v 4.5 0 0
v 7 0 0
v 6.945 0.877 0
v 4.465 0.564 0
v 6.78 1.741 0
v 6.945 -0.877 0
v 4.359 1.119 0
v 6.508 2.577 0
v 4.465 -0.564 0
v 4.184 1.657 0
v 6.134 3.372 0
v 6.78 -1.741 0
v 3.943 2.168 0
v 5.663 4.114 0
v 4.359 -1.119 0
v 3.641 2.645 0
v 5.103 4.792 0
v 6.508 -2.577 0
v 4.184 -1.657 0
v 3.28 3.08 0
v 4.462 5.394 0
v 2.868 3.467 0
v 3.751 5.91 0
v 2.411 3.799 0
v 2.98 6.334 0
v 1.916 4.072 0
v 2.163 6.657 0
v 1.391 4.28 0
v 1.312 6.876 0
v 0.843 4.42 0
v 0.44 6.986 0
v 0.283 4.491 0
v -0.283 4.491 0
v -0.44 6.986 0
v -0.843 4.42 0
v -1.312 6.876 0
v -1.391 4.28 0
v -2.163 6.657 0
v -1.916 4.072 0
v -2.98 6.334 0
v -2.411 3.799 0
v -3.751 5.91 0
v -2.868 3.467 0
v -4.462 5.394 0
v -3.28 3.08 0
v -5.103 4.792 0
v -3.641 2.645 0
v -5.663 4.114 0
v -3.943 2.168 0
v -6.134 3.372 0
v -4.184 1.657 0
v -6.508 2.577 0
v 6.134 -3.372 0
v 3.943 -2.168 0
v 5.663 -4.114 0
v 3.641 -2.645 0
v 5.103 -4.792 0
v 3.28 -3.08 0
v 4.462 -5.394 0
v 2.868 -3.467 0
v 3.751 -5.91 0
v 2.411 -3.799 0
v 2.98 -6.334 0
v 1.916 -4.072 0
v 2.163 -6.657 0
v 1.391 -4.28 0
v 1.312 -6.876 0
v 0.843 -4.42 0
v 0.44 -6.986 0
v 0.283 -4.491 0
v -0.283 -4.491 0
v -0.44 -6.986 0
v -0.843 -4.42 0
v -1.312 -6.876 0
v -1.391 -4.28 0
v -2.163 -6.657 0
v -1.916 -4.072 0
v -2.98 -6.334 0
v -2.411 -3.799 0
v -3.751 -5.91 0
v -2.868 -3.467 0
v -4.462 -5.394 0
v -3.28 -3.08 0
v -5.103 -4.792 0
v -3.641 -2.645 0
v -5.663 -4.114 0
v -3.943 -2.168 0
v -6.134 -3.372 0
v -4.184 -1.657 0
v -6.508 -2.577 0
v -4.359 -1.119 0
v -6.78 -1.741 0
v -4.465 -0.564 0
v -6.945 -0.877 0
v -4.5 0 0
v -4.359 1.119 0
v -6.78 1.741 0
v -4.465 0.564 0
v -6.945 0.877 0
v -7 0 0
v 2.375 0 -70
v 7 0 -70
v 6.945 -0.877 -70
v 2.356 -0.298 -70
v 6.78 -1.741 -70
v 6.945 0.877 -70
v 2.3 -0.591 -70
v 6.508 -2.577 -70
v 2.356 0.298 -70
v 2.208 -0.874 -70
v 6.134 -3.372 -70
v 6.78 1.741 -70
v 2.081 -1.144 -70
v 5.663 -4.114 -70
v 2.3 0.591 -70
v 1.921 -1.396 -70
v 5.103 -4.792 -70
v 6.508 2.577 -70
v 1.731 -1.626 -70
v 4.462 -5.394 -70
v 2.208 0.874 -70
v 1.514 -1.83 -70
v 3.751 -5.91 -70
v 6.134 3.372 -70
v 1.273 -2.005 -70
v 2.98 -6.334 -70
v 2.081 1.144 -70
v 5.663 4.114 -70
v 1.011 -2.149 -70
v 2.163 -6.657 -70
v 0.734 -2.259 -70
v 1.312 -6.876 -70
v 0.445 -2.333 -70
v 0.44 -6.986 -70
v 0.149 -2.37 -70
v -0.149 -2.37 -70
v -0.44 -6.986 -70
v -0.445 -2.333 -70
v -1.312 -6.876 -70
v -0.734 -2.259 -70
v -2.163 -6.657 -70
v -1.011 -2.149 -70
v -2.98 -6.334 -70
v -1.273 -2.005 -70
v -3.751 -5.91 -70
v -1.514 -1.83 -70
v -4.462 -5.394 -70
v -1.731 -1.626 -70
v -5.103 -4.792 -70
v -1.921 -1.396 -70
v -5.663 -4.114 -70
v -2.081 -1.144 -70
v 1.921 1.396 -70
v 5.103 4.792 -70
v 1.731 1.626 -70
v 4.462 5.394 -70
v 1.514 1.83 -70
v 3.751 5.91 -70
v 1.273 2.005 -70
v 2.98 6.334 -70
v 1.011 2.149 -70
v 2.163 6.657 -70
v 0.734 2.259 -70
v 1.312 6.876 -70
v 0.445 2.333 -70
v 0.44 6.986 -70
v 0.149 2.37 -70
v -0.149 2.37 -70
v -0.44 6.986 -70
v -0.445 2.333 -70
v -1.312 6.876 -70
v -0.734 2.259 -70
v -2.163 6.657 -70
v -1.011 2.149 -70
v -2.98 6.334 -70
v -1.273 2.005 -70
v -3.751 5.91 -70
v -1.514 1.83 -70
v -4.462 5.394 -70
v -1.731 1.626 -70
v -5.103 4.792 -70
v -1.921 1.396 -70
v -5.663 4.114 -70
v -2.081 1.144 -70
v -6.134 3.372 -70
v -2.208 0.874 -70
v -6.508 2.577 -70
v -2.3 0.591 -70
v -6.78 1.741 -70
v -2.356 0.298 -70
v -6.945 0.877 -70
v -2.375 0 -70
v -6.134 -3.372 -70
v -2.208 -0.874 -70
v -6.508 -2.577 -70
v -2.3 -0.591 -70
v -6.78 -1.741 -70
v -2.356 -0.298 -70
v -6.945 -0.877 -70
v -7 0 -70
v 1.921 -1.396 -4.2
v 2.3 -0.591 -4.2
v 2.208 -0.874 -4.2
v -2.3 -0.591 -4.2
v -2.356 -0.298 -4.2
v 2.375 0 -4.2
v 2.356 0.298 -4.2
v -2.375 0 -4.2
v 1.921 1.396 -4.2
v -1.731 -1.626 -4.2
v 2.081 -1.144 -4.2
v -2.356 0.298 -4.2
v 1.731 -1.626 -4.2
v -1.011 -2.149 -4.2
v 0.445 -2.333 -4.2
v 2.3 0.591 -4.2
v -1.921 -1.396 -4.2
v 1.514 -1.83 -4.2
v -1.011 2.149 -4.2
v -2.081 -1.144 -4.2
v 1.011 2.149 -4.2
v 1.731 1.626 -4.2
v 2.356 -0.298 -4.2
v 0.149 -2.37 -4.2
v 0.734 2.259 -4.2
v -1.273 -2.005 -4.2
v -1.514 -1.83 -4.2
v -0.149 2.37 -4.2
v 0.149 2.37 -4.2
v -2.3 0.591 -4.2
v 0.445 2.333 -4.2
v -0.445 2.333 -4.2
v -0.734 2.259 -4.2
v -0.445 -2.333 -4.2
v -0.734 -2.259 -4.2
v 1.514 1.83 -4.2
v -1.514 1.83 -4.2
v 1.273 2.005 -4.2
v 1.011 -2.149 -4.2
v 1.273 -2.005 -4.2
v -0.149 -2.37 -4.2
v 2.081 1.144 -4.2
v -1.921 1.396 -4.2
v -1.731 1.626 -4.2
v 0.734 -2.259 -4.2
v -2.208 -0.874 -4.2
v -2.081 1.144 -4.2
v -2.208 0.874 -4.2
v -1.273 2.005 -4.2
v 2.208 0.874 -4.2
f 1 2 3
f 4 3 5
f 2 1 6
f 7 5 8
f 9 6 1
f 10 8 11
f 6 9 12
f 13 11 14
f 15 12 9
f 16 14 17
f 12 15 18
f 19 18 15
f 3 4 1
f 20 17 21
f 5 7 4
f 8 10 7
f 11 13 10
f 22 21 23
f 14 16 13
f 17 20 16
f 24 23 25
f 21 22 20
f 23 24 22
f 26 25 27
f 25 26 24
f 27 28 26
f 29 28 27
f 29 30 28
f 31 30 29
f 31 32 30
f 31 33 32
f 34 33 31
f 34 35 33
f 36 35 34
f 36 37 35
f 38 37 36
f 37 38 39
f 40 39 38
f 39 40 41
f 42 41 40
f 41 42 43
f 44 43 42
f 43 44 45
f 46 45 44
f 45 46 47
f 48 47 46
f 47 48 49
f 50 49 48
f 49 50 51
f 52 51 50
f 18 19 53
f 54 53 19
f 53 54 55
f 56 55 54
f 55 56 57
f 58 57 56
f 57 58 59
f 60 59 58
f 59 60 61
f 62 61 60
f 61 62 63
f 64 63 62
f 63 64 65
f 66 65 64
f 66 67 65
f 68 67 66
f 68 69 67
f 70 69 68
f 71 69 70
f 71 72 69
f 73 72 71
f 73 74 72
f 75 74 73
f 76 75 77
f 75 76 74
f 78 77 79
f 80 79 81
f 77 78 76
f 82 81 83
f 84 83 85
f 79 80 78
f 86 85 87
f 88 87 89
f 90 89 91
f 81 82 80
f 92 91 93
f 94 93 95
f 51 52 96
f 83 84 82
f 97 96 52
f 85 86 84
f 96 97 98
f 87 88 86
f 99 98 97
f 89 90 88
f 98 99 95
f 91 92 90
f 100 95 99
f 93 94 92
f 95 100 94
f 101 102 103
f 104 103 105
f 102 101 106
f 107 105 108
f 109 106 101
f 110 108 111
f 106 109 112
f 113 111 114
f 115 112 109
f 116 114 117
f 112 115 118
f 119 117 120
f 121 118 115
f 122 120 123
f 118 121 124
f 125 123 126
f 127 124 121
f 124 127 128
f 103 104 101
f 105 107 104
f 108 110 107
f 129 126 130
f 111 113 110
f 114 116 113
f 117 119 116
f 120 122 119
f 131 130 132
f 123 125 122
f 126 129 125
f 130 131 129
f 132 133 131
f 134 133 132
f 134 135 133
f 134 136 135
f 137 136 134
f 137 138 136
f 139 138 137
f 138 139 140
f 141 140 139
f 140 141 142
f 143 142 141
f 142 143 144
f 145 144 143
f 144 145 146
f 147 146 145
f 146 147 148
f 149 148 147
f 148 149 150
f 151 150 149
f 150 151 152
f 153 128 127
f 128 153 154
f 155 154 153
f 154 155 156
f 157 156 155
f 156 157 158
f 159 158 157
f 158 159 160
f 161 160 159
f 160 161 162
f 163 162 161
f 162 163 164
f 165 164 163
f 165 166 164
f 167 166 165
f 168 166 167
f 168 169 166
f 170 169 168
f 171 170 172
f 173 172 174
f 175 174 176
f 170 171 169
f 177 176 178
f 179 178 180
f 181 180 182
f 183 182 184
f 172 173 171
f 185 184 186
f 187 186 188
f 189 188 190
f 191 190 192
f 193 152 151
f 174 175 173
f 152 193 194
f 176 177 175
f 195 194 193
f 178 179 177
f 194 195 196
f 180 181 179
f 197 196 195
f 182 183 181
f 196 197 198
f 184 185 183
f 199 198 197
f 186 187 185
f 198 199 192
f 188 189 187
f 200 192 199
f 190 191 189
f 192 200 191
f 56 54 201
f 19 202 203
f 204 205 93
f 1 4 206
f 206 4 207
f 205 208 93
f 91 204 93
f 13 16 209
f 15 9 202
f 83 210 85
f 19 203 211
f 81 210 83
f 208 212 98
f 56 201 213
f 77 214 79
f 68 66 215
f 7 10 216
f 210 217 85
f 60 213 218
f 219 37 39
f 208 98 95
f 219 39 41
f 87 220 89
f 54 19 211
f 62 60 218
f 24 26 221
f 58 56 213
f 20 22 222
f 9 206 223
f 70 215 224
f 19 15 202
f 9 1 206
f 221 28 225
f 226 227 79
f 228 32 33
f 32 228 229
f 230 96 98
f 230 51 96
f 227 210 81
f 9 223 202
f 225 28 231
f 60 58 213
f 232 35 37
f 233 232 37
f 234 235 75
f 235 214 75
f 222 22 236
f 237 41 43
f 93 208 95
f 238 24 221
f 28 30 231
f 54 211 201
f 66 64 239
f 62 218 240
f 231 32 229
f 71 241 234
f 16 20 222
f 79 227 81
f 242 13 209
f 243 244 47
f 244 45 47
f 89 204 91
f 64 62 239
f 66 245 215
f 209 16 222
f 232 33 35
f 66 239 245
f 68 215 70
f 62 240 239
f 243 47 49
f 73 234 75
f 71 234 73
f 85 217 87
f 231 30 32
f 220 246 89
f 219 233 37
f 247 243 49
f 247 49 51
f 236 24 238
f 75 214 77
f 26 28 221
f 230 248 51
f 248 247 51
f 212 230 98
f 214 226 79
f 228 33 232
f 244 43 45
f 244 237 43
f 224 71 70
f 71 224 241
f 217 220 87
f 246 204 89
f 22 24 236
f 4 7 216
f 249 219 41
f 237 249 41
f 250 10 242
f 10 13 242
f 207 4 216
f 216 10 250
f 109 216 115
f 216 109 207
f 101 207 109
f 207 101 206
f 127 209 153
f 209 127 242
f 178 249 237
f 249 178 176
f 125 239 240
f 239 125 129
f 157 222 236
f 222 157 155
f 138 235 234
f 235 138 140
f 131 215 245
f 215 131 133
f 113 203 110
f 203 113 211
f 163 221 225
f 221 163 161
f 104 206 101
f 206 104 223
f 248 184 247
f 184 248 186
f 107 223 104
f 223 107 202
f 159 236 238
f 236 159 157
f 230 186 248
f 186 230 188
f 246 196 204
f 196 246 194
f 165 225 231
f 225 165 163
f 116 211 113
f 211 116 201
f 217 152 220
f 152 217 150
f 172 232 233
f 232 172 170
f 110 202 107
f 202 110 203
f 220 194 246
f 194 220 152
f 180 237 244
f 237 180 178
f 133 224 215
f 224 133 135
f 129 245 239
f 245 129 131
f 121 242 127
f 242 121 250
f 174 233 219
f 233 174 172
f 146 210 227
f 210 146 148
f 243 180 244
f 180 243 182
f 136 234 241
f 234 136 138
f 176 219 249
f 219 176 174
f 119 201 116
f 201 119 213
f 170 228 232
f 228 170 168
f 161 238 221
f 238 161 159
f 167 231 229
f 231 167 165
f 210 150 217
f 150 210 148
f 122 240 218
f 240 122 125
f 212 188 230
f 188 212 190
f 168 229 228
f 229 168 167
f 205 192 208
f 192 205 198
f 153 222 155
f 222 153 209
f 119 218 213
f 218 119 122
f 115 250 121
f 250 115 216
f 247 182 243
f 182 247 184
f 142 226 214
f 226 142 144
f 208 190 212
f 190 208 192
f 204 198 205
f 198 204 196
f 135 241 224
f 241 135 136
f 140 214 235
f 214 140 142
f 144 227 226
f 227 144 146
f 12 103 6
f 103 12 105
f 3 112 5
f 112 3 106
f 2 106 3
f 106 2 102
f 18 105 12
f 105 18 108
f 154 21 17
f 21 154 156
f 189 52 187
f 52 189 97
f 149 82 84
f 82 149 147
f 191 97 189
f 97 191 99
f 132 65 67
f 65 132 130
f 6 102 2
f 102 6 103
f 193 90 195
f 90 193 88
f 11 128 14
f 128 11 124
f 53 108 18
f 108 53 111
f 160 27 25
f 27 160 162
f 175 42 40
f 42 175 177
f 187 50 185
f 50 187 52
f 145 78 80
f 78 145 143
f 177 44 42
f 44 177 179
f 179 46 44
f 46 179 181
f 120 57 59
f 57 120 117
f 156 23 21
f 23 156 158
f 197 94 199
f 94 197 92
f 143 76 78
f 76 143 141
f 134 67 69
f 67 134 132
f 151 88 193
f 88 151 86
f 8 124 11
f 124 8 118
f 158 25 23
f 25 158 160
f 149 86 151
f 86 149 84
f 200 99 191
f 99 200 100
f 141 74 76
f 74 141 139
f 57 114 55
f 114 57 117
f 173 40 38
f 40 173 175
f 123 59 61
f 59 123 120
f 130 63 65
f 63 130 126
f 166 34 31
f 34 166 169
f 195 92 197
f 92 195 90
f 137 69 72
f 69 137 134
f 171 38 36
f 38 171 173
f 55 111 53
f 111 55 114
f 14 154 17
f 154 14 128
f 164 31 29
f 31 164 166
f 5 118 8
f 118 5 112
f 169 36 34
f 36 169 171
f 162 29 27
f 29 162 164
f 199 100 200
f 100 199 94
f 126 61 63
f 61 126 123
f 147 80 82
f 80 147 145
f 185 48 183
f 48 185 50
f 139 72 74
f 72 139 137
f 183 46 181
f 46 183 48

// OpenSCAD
$fn = 50;


difference() {
	union() {
		translate(v = [0, 0, -70.0000000000]) {
			cylinder(h = 70, r = 7.0000000000);
		}
		cylinder(h = 0, r = 13.0000000000);
	}
	union() {
		translate(v = [0, 0, 0]) {
			rotate(a = [0, 0, 0]) {
				difference() {
					union() {
						#translate(v = [0, 0, -70.0000000000]) {
							cylinder(h = 70, r = 2.2500000000);
						}
						#translate(v = [0, 0, -4.2000000000]) {
							cylinder(h = 4.2000000000, r1 = 2.3750000000, r2 = 4.5000000000);
						}
						#translate(v = [0, 0, -70.0000000000]) {
							cylinder(h = 70, r = 2.3750000000);
						}
						#translate(v = [0, 0, -70.0000000000]) {
							cylinder(h = 70, r = 2.2500000000);
						}
					}
					union();
				}
			}
		}
	}
}
